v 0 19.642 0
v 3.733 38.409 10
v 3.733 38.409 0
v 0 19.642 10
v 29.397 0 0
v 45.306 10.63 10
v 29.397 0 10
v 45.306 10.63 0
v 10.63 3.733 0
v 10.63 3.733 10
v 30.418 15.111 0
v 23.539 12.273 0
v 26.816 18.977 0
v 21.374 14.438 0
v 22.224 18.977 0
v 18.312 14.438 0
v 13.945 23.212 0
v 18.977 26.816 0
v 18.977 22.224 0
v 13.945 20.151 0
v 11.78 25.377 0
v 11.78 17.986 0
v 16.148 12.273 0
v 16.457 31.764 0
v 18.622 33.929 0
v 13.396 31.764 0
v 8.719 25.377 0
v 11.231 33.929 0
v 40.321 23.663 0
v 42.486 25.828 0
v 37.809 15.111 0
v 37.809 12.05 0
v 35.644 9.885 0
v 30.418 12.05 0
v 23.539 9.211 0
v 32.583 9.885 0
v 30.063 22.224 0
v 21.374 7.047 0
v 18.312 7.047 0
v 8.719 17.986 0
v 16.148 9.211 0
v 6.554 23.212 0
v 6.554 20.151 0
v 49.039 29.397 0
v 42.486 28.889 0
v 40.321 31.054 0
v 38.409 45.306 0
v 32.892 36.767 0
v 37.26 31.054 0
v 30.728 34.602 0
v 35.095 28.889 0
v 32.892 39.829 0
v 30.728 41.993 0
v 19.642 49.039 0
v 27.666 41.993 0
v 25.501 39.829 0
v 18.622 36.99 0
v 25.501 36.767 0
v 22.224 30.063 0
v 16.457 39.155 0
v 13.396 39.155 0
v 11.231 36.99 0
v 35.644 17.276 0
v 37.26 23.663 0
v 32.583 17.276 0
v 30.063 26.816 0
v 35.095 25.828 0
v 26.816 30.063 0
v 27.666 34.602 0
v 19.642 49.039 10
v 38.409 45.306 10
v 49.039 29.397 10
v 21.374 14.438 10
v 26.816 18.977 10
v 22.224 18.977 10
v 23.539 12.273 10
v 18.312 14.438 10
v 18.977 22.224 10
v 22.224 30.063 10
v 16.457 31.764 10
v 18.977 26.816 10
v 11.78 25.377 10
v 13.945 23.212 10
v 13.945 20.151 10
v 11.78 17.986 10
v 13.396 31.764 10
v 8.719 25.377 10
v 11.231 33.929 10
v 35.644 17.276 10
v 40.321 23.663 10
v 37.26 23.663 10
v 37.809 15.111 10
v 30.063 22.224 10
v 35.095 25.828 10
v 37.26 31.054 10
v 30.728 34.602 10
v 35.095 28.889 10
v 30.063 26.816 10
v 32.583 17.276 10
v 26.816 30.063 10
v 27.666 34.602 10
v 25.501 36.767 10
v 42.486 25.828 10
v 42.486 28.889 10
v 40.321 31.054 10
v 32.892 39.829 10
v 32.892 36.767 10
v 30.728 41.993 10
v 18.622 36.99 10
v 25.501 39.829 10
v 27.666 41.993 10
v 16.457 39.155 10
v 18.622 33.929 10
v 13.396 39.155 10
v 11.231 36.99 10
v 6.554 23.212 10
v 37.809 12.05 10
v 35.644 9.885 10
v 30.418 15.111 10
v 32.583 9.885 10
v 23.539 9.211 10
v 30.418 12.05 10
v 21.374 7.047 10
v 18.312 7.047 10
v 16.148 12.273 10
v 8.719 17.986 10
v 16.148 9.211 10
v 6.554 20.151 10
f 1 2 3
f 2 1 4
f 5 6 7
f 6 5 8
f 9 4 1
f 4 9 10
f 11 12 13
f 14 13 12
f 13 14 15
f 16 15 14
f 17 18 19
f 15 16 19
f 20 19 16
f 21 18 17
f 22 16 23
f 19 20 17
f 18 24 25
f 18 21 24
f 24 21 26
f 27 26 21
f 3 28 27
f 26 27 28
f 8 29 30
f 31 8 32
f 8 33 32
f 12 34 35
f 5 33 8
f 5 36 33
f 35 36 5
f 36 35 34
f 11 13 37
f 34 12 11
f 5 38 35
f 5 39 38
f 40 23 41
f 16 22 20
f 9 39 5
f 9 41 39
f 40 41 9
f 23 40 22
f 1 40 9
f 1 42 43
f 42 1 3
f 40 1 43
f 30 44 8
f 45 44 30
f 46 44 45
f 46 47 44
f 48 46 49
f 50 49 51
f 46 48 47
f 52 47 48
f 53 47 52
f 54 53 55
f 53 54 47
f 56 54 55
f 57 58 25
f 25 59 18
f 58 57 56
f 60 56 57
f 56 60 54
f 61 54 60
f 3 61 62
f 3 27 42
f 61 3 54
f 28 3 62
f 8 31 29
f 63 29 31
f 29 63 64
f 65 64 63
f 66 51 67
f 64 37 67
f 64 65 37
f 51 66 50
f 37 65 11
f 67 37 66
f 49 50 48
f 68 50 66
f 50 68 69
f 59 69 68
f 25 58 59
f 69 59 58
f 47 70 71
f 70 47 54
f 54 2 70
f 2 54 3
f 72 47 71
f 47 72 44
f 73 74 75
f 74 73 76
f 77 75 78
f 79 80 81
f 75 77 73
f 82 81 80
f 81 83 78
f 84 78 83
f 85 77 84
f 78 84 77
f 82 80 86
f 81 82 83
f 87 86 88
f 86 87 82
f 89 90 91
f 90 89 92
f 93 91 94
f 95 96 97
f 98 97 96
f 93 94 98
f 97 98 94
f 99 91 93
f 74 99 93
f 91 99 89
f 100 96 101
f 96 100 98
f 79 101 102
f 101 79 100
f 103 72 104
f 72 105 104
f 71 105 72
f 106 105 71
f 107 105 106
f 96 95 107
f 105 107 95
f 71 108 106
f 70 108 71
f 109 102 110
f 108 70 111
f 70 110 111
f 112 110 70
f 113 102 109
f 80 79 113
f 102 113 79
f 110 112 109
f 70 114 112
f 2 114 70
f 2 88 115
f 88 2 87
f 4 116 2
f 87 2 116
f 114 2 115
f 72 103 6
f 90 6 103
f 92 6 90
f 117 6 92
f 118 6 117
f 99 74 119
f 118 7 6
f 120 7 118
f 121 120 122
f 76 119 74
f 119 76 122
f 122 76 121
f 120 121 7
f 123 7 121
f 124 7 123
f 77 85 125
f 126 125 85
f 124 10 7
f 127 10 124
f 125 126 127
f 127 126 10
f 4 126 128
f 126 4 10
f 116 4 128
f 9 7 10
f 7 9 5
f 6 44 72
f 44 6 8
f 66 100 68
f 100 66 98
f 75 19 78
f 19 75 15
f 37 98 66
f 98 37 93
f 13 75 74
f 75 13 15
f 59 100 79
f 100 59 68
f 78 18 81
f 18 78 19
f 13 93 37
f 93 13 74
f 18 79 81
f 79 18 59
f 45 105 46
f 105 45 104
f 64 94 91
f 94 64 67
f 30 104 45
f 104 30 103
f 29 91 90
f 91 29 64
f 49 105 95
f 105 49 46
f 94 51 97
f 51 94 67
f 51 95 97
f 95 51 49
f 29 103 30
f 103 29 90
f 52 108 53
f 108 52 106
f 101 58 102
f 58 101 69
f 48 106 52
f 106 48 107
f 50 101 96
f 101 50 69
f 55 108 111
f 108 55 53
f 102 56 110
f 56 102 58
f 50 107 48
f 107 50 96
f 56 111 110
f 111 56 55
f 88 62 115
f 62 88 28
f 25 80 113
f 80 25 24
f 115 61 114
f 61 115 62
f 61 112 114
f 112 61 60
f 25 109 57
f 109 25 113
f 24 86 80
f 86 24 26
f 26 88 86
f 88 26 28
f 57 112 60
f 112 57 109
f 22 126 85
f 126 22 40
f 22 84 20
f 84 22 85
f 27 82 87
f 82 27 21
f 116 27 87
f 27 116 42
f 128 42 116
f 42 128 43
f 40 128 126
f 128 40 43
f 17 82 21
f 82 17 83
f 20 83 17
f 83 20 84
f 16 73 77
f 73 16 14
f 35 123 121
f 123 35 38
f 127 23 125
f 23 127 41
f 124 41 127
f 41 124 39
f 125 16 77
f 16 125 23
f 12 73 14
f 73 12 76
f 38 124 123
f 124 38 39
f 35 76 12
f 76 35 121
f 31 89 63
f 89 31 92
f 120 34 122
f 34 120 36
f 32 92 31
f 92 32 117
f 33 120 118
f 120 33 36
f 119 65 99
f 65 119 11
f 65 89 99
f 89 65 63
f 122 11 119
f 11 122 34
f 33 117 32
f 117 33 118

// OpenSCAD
$fn = 32;

// ----------------------------------------------------------------------
// Polygon plate: 8-gon R25, 6 bolt windows
// ----------------------------------------------------------------------

// --- parameters (mm) ---
sides = 8;                // number of polygon sides
plate_r = 25;             // circumscribed radius of the polygon
bore_r = 6;               // centre bore radius
bolts = 6;                // number of bolt windows
ring_r = 14.55;           // bolt-circle radius
bolt_r = 4;               // bolt window radius
plate_t = 10;             // plate thickness, Z (extrusion height)

plate_d = 2 * plate_r;  // circumscribed diameter
bore_d = 2 * bore_r;  // centre bore diameter
bolt_d = 2 * bolt_r;  // bolt window diameter
ring_d = 2 * ring_r;  // bolt-circle diameter

profile = [[49.039, 29.397], [38.409, 45.306], [19.642, 49.039], [3.733, 38.409], [0, 19.642], [10.63, 3.733], [29.397, 0], [45.306, 10.63]];  // primary outline, 8 points, counter clockwise
void_1 = [[30.063, 26.816], [26.816, 30.063], [22.224, 30.063], [18.977, 26.816], [18.977, 22.224], [22.224, 18.977], [26.816, 18.977], [30.063, 22.224]];  // centre bore, 8 points
void_2 = [[42.486, 28.889], [40.321, 31.054], [37.26, 31.054], [35.095, 28.889], [35.095, 25.828], [37.26, 23.663], [40.321, 23.663], [42.486, 25.828]];  // bolt window 1, 8 points
void_3 = [[32.892, 39.829], [30.728, 41.993], [27.666, 41.993], [25.501, 39.829], [25.501, 36.767], [27.666, 34.602], [30.728, 34.602], [32.892, 36.767]];  // bolt window 2, 8 points
void_4 = [[18.622, 36.99], [16.457, 39.155], [13.396, 39.155], [11.231, 36.99], [11.231, 33.929], [13.396, 31.764], [16.457, 31.764], [18.622, 33.929]];  // bolt window 3, 8 points
void_5 = [[13.945, 23.212], [11.78, 25.377], [8.719, 25.377], [6.554, 23.212], [6.554, 20.151], [8.719, 17.986], [11.78, 17.986], [13.945, 20.151]];  // bolt window 4, 8 points
void_6 = [[23.539, 12.273], [21.374, 14.438], [18.312, 14.438], [16.148, 12.273], [16.148, 9.211], [18.312, 7.047], [21.374, 7.047], [23.539, 9.211]];  // bolt window 5, 8 points
void_7 = [[37.809, 15.111], [35.644, 17.276], [32.583, 17.276], [30.418, 15.111], [30.418, 12.05], [32.583, 9.885], [35.644, 9.885], [37.809, 12.05]];  // bolt window 6, 8 points

// --- the one profile operation ---
difference() {
  linear_extrude(height = plate_t) polygon(points = profile);
  translate([0, 0, -1])
    linear_extrude(height = plate_t + 2) polygon(points = void_1);
  translate([0, 0, -1])
    linear_extrude(height = plate_t + 2) polygon(points = void_2);
  translate([0, 0, -1])
    linear_extrude(height = plate_t + 2) polygon(points = void_3);
  translate([0, 0, -1])
    linear_extrude(height = plate_t + 2) polygon(points = void_4);
  translate([0, 0, -1])
    linear_extrude(height = plate_t + 2) polygon(points = void_5);
  translate([0, 0, -1])
    linear_extrude(height = plate_t + 2) polygon(points = void_6);
  translate([0, 0, -1])
    linear_extrude(height = plate_t + 2) polygon(points = void_7);
}
